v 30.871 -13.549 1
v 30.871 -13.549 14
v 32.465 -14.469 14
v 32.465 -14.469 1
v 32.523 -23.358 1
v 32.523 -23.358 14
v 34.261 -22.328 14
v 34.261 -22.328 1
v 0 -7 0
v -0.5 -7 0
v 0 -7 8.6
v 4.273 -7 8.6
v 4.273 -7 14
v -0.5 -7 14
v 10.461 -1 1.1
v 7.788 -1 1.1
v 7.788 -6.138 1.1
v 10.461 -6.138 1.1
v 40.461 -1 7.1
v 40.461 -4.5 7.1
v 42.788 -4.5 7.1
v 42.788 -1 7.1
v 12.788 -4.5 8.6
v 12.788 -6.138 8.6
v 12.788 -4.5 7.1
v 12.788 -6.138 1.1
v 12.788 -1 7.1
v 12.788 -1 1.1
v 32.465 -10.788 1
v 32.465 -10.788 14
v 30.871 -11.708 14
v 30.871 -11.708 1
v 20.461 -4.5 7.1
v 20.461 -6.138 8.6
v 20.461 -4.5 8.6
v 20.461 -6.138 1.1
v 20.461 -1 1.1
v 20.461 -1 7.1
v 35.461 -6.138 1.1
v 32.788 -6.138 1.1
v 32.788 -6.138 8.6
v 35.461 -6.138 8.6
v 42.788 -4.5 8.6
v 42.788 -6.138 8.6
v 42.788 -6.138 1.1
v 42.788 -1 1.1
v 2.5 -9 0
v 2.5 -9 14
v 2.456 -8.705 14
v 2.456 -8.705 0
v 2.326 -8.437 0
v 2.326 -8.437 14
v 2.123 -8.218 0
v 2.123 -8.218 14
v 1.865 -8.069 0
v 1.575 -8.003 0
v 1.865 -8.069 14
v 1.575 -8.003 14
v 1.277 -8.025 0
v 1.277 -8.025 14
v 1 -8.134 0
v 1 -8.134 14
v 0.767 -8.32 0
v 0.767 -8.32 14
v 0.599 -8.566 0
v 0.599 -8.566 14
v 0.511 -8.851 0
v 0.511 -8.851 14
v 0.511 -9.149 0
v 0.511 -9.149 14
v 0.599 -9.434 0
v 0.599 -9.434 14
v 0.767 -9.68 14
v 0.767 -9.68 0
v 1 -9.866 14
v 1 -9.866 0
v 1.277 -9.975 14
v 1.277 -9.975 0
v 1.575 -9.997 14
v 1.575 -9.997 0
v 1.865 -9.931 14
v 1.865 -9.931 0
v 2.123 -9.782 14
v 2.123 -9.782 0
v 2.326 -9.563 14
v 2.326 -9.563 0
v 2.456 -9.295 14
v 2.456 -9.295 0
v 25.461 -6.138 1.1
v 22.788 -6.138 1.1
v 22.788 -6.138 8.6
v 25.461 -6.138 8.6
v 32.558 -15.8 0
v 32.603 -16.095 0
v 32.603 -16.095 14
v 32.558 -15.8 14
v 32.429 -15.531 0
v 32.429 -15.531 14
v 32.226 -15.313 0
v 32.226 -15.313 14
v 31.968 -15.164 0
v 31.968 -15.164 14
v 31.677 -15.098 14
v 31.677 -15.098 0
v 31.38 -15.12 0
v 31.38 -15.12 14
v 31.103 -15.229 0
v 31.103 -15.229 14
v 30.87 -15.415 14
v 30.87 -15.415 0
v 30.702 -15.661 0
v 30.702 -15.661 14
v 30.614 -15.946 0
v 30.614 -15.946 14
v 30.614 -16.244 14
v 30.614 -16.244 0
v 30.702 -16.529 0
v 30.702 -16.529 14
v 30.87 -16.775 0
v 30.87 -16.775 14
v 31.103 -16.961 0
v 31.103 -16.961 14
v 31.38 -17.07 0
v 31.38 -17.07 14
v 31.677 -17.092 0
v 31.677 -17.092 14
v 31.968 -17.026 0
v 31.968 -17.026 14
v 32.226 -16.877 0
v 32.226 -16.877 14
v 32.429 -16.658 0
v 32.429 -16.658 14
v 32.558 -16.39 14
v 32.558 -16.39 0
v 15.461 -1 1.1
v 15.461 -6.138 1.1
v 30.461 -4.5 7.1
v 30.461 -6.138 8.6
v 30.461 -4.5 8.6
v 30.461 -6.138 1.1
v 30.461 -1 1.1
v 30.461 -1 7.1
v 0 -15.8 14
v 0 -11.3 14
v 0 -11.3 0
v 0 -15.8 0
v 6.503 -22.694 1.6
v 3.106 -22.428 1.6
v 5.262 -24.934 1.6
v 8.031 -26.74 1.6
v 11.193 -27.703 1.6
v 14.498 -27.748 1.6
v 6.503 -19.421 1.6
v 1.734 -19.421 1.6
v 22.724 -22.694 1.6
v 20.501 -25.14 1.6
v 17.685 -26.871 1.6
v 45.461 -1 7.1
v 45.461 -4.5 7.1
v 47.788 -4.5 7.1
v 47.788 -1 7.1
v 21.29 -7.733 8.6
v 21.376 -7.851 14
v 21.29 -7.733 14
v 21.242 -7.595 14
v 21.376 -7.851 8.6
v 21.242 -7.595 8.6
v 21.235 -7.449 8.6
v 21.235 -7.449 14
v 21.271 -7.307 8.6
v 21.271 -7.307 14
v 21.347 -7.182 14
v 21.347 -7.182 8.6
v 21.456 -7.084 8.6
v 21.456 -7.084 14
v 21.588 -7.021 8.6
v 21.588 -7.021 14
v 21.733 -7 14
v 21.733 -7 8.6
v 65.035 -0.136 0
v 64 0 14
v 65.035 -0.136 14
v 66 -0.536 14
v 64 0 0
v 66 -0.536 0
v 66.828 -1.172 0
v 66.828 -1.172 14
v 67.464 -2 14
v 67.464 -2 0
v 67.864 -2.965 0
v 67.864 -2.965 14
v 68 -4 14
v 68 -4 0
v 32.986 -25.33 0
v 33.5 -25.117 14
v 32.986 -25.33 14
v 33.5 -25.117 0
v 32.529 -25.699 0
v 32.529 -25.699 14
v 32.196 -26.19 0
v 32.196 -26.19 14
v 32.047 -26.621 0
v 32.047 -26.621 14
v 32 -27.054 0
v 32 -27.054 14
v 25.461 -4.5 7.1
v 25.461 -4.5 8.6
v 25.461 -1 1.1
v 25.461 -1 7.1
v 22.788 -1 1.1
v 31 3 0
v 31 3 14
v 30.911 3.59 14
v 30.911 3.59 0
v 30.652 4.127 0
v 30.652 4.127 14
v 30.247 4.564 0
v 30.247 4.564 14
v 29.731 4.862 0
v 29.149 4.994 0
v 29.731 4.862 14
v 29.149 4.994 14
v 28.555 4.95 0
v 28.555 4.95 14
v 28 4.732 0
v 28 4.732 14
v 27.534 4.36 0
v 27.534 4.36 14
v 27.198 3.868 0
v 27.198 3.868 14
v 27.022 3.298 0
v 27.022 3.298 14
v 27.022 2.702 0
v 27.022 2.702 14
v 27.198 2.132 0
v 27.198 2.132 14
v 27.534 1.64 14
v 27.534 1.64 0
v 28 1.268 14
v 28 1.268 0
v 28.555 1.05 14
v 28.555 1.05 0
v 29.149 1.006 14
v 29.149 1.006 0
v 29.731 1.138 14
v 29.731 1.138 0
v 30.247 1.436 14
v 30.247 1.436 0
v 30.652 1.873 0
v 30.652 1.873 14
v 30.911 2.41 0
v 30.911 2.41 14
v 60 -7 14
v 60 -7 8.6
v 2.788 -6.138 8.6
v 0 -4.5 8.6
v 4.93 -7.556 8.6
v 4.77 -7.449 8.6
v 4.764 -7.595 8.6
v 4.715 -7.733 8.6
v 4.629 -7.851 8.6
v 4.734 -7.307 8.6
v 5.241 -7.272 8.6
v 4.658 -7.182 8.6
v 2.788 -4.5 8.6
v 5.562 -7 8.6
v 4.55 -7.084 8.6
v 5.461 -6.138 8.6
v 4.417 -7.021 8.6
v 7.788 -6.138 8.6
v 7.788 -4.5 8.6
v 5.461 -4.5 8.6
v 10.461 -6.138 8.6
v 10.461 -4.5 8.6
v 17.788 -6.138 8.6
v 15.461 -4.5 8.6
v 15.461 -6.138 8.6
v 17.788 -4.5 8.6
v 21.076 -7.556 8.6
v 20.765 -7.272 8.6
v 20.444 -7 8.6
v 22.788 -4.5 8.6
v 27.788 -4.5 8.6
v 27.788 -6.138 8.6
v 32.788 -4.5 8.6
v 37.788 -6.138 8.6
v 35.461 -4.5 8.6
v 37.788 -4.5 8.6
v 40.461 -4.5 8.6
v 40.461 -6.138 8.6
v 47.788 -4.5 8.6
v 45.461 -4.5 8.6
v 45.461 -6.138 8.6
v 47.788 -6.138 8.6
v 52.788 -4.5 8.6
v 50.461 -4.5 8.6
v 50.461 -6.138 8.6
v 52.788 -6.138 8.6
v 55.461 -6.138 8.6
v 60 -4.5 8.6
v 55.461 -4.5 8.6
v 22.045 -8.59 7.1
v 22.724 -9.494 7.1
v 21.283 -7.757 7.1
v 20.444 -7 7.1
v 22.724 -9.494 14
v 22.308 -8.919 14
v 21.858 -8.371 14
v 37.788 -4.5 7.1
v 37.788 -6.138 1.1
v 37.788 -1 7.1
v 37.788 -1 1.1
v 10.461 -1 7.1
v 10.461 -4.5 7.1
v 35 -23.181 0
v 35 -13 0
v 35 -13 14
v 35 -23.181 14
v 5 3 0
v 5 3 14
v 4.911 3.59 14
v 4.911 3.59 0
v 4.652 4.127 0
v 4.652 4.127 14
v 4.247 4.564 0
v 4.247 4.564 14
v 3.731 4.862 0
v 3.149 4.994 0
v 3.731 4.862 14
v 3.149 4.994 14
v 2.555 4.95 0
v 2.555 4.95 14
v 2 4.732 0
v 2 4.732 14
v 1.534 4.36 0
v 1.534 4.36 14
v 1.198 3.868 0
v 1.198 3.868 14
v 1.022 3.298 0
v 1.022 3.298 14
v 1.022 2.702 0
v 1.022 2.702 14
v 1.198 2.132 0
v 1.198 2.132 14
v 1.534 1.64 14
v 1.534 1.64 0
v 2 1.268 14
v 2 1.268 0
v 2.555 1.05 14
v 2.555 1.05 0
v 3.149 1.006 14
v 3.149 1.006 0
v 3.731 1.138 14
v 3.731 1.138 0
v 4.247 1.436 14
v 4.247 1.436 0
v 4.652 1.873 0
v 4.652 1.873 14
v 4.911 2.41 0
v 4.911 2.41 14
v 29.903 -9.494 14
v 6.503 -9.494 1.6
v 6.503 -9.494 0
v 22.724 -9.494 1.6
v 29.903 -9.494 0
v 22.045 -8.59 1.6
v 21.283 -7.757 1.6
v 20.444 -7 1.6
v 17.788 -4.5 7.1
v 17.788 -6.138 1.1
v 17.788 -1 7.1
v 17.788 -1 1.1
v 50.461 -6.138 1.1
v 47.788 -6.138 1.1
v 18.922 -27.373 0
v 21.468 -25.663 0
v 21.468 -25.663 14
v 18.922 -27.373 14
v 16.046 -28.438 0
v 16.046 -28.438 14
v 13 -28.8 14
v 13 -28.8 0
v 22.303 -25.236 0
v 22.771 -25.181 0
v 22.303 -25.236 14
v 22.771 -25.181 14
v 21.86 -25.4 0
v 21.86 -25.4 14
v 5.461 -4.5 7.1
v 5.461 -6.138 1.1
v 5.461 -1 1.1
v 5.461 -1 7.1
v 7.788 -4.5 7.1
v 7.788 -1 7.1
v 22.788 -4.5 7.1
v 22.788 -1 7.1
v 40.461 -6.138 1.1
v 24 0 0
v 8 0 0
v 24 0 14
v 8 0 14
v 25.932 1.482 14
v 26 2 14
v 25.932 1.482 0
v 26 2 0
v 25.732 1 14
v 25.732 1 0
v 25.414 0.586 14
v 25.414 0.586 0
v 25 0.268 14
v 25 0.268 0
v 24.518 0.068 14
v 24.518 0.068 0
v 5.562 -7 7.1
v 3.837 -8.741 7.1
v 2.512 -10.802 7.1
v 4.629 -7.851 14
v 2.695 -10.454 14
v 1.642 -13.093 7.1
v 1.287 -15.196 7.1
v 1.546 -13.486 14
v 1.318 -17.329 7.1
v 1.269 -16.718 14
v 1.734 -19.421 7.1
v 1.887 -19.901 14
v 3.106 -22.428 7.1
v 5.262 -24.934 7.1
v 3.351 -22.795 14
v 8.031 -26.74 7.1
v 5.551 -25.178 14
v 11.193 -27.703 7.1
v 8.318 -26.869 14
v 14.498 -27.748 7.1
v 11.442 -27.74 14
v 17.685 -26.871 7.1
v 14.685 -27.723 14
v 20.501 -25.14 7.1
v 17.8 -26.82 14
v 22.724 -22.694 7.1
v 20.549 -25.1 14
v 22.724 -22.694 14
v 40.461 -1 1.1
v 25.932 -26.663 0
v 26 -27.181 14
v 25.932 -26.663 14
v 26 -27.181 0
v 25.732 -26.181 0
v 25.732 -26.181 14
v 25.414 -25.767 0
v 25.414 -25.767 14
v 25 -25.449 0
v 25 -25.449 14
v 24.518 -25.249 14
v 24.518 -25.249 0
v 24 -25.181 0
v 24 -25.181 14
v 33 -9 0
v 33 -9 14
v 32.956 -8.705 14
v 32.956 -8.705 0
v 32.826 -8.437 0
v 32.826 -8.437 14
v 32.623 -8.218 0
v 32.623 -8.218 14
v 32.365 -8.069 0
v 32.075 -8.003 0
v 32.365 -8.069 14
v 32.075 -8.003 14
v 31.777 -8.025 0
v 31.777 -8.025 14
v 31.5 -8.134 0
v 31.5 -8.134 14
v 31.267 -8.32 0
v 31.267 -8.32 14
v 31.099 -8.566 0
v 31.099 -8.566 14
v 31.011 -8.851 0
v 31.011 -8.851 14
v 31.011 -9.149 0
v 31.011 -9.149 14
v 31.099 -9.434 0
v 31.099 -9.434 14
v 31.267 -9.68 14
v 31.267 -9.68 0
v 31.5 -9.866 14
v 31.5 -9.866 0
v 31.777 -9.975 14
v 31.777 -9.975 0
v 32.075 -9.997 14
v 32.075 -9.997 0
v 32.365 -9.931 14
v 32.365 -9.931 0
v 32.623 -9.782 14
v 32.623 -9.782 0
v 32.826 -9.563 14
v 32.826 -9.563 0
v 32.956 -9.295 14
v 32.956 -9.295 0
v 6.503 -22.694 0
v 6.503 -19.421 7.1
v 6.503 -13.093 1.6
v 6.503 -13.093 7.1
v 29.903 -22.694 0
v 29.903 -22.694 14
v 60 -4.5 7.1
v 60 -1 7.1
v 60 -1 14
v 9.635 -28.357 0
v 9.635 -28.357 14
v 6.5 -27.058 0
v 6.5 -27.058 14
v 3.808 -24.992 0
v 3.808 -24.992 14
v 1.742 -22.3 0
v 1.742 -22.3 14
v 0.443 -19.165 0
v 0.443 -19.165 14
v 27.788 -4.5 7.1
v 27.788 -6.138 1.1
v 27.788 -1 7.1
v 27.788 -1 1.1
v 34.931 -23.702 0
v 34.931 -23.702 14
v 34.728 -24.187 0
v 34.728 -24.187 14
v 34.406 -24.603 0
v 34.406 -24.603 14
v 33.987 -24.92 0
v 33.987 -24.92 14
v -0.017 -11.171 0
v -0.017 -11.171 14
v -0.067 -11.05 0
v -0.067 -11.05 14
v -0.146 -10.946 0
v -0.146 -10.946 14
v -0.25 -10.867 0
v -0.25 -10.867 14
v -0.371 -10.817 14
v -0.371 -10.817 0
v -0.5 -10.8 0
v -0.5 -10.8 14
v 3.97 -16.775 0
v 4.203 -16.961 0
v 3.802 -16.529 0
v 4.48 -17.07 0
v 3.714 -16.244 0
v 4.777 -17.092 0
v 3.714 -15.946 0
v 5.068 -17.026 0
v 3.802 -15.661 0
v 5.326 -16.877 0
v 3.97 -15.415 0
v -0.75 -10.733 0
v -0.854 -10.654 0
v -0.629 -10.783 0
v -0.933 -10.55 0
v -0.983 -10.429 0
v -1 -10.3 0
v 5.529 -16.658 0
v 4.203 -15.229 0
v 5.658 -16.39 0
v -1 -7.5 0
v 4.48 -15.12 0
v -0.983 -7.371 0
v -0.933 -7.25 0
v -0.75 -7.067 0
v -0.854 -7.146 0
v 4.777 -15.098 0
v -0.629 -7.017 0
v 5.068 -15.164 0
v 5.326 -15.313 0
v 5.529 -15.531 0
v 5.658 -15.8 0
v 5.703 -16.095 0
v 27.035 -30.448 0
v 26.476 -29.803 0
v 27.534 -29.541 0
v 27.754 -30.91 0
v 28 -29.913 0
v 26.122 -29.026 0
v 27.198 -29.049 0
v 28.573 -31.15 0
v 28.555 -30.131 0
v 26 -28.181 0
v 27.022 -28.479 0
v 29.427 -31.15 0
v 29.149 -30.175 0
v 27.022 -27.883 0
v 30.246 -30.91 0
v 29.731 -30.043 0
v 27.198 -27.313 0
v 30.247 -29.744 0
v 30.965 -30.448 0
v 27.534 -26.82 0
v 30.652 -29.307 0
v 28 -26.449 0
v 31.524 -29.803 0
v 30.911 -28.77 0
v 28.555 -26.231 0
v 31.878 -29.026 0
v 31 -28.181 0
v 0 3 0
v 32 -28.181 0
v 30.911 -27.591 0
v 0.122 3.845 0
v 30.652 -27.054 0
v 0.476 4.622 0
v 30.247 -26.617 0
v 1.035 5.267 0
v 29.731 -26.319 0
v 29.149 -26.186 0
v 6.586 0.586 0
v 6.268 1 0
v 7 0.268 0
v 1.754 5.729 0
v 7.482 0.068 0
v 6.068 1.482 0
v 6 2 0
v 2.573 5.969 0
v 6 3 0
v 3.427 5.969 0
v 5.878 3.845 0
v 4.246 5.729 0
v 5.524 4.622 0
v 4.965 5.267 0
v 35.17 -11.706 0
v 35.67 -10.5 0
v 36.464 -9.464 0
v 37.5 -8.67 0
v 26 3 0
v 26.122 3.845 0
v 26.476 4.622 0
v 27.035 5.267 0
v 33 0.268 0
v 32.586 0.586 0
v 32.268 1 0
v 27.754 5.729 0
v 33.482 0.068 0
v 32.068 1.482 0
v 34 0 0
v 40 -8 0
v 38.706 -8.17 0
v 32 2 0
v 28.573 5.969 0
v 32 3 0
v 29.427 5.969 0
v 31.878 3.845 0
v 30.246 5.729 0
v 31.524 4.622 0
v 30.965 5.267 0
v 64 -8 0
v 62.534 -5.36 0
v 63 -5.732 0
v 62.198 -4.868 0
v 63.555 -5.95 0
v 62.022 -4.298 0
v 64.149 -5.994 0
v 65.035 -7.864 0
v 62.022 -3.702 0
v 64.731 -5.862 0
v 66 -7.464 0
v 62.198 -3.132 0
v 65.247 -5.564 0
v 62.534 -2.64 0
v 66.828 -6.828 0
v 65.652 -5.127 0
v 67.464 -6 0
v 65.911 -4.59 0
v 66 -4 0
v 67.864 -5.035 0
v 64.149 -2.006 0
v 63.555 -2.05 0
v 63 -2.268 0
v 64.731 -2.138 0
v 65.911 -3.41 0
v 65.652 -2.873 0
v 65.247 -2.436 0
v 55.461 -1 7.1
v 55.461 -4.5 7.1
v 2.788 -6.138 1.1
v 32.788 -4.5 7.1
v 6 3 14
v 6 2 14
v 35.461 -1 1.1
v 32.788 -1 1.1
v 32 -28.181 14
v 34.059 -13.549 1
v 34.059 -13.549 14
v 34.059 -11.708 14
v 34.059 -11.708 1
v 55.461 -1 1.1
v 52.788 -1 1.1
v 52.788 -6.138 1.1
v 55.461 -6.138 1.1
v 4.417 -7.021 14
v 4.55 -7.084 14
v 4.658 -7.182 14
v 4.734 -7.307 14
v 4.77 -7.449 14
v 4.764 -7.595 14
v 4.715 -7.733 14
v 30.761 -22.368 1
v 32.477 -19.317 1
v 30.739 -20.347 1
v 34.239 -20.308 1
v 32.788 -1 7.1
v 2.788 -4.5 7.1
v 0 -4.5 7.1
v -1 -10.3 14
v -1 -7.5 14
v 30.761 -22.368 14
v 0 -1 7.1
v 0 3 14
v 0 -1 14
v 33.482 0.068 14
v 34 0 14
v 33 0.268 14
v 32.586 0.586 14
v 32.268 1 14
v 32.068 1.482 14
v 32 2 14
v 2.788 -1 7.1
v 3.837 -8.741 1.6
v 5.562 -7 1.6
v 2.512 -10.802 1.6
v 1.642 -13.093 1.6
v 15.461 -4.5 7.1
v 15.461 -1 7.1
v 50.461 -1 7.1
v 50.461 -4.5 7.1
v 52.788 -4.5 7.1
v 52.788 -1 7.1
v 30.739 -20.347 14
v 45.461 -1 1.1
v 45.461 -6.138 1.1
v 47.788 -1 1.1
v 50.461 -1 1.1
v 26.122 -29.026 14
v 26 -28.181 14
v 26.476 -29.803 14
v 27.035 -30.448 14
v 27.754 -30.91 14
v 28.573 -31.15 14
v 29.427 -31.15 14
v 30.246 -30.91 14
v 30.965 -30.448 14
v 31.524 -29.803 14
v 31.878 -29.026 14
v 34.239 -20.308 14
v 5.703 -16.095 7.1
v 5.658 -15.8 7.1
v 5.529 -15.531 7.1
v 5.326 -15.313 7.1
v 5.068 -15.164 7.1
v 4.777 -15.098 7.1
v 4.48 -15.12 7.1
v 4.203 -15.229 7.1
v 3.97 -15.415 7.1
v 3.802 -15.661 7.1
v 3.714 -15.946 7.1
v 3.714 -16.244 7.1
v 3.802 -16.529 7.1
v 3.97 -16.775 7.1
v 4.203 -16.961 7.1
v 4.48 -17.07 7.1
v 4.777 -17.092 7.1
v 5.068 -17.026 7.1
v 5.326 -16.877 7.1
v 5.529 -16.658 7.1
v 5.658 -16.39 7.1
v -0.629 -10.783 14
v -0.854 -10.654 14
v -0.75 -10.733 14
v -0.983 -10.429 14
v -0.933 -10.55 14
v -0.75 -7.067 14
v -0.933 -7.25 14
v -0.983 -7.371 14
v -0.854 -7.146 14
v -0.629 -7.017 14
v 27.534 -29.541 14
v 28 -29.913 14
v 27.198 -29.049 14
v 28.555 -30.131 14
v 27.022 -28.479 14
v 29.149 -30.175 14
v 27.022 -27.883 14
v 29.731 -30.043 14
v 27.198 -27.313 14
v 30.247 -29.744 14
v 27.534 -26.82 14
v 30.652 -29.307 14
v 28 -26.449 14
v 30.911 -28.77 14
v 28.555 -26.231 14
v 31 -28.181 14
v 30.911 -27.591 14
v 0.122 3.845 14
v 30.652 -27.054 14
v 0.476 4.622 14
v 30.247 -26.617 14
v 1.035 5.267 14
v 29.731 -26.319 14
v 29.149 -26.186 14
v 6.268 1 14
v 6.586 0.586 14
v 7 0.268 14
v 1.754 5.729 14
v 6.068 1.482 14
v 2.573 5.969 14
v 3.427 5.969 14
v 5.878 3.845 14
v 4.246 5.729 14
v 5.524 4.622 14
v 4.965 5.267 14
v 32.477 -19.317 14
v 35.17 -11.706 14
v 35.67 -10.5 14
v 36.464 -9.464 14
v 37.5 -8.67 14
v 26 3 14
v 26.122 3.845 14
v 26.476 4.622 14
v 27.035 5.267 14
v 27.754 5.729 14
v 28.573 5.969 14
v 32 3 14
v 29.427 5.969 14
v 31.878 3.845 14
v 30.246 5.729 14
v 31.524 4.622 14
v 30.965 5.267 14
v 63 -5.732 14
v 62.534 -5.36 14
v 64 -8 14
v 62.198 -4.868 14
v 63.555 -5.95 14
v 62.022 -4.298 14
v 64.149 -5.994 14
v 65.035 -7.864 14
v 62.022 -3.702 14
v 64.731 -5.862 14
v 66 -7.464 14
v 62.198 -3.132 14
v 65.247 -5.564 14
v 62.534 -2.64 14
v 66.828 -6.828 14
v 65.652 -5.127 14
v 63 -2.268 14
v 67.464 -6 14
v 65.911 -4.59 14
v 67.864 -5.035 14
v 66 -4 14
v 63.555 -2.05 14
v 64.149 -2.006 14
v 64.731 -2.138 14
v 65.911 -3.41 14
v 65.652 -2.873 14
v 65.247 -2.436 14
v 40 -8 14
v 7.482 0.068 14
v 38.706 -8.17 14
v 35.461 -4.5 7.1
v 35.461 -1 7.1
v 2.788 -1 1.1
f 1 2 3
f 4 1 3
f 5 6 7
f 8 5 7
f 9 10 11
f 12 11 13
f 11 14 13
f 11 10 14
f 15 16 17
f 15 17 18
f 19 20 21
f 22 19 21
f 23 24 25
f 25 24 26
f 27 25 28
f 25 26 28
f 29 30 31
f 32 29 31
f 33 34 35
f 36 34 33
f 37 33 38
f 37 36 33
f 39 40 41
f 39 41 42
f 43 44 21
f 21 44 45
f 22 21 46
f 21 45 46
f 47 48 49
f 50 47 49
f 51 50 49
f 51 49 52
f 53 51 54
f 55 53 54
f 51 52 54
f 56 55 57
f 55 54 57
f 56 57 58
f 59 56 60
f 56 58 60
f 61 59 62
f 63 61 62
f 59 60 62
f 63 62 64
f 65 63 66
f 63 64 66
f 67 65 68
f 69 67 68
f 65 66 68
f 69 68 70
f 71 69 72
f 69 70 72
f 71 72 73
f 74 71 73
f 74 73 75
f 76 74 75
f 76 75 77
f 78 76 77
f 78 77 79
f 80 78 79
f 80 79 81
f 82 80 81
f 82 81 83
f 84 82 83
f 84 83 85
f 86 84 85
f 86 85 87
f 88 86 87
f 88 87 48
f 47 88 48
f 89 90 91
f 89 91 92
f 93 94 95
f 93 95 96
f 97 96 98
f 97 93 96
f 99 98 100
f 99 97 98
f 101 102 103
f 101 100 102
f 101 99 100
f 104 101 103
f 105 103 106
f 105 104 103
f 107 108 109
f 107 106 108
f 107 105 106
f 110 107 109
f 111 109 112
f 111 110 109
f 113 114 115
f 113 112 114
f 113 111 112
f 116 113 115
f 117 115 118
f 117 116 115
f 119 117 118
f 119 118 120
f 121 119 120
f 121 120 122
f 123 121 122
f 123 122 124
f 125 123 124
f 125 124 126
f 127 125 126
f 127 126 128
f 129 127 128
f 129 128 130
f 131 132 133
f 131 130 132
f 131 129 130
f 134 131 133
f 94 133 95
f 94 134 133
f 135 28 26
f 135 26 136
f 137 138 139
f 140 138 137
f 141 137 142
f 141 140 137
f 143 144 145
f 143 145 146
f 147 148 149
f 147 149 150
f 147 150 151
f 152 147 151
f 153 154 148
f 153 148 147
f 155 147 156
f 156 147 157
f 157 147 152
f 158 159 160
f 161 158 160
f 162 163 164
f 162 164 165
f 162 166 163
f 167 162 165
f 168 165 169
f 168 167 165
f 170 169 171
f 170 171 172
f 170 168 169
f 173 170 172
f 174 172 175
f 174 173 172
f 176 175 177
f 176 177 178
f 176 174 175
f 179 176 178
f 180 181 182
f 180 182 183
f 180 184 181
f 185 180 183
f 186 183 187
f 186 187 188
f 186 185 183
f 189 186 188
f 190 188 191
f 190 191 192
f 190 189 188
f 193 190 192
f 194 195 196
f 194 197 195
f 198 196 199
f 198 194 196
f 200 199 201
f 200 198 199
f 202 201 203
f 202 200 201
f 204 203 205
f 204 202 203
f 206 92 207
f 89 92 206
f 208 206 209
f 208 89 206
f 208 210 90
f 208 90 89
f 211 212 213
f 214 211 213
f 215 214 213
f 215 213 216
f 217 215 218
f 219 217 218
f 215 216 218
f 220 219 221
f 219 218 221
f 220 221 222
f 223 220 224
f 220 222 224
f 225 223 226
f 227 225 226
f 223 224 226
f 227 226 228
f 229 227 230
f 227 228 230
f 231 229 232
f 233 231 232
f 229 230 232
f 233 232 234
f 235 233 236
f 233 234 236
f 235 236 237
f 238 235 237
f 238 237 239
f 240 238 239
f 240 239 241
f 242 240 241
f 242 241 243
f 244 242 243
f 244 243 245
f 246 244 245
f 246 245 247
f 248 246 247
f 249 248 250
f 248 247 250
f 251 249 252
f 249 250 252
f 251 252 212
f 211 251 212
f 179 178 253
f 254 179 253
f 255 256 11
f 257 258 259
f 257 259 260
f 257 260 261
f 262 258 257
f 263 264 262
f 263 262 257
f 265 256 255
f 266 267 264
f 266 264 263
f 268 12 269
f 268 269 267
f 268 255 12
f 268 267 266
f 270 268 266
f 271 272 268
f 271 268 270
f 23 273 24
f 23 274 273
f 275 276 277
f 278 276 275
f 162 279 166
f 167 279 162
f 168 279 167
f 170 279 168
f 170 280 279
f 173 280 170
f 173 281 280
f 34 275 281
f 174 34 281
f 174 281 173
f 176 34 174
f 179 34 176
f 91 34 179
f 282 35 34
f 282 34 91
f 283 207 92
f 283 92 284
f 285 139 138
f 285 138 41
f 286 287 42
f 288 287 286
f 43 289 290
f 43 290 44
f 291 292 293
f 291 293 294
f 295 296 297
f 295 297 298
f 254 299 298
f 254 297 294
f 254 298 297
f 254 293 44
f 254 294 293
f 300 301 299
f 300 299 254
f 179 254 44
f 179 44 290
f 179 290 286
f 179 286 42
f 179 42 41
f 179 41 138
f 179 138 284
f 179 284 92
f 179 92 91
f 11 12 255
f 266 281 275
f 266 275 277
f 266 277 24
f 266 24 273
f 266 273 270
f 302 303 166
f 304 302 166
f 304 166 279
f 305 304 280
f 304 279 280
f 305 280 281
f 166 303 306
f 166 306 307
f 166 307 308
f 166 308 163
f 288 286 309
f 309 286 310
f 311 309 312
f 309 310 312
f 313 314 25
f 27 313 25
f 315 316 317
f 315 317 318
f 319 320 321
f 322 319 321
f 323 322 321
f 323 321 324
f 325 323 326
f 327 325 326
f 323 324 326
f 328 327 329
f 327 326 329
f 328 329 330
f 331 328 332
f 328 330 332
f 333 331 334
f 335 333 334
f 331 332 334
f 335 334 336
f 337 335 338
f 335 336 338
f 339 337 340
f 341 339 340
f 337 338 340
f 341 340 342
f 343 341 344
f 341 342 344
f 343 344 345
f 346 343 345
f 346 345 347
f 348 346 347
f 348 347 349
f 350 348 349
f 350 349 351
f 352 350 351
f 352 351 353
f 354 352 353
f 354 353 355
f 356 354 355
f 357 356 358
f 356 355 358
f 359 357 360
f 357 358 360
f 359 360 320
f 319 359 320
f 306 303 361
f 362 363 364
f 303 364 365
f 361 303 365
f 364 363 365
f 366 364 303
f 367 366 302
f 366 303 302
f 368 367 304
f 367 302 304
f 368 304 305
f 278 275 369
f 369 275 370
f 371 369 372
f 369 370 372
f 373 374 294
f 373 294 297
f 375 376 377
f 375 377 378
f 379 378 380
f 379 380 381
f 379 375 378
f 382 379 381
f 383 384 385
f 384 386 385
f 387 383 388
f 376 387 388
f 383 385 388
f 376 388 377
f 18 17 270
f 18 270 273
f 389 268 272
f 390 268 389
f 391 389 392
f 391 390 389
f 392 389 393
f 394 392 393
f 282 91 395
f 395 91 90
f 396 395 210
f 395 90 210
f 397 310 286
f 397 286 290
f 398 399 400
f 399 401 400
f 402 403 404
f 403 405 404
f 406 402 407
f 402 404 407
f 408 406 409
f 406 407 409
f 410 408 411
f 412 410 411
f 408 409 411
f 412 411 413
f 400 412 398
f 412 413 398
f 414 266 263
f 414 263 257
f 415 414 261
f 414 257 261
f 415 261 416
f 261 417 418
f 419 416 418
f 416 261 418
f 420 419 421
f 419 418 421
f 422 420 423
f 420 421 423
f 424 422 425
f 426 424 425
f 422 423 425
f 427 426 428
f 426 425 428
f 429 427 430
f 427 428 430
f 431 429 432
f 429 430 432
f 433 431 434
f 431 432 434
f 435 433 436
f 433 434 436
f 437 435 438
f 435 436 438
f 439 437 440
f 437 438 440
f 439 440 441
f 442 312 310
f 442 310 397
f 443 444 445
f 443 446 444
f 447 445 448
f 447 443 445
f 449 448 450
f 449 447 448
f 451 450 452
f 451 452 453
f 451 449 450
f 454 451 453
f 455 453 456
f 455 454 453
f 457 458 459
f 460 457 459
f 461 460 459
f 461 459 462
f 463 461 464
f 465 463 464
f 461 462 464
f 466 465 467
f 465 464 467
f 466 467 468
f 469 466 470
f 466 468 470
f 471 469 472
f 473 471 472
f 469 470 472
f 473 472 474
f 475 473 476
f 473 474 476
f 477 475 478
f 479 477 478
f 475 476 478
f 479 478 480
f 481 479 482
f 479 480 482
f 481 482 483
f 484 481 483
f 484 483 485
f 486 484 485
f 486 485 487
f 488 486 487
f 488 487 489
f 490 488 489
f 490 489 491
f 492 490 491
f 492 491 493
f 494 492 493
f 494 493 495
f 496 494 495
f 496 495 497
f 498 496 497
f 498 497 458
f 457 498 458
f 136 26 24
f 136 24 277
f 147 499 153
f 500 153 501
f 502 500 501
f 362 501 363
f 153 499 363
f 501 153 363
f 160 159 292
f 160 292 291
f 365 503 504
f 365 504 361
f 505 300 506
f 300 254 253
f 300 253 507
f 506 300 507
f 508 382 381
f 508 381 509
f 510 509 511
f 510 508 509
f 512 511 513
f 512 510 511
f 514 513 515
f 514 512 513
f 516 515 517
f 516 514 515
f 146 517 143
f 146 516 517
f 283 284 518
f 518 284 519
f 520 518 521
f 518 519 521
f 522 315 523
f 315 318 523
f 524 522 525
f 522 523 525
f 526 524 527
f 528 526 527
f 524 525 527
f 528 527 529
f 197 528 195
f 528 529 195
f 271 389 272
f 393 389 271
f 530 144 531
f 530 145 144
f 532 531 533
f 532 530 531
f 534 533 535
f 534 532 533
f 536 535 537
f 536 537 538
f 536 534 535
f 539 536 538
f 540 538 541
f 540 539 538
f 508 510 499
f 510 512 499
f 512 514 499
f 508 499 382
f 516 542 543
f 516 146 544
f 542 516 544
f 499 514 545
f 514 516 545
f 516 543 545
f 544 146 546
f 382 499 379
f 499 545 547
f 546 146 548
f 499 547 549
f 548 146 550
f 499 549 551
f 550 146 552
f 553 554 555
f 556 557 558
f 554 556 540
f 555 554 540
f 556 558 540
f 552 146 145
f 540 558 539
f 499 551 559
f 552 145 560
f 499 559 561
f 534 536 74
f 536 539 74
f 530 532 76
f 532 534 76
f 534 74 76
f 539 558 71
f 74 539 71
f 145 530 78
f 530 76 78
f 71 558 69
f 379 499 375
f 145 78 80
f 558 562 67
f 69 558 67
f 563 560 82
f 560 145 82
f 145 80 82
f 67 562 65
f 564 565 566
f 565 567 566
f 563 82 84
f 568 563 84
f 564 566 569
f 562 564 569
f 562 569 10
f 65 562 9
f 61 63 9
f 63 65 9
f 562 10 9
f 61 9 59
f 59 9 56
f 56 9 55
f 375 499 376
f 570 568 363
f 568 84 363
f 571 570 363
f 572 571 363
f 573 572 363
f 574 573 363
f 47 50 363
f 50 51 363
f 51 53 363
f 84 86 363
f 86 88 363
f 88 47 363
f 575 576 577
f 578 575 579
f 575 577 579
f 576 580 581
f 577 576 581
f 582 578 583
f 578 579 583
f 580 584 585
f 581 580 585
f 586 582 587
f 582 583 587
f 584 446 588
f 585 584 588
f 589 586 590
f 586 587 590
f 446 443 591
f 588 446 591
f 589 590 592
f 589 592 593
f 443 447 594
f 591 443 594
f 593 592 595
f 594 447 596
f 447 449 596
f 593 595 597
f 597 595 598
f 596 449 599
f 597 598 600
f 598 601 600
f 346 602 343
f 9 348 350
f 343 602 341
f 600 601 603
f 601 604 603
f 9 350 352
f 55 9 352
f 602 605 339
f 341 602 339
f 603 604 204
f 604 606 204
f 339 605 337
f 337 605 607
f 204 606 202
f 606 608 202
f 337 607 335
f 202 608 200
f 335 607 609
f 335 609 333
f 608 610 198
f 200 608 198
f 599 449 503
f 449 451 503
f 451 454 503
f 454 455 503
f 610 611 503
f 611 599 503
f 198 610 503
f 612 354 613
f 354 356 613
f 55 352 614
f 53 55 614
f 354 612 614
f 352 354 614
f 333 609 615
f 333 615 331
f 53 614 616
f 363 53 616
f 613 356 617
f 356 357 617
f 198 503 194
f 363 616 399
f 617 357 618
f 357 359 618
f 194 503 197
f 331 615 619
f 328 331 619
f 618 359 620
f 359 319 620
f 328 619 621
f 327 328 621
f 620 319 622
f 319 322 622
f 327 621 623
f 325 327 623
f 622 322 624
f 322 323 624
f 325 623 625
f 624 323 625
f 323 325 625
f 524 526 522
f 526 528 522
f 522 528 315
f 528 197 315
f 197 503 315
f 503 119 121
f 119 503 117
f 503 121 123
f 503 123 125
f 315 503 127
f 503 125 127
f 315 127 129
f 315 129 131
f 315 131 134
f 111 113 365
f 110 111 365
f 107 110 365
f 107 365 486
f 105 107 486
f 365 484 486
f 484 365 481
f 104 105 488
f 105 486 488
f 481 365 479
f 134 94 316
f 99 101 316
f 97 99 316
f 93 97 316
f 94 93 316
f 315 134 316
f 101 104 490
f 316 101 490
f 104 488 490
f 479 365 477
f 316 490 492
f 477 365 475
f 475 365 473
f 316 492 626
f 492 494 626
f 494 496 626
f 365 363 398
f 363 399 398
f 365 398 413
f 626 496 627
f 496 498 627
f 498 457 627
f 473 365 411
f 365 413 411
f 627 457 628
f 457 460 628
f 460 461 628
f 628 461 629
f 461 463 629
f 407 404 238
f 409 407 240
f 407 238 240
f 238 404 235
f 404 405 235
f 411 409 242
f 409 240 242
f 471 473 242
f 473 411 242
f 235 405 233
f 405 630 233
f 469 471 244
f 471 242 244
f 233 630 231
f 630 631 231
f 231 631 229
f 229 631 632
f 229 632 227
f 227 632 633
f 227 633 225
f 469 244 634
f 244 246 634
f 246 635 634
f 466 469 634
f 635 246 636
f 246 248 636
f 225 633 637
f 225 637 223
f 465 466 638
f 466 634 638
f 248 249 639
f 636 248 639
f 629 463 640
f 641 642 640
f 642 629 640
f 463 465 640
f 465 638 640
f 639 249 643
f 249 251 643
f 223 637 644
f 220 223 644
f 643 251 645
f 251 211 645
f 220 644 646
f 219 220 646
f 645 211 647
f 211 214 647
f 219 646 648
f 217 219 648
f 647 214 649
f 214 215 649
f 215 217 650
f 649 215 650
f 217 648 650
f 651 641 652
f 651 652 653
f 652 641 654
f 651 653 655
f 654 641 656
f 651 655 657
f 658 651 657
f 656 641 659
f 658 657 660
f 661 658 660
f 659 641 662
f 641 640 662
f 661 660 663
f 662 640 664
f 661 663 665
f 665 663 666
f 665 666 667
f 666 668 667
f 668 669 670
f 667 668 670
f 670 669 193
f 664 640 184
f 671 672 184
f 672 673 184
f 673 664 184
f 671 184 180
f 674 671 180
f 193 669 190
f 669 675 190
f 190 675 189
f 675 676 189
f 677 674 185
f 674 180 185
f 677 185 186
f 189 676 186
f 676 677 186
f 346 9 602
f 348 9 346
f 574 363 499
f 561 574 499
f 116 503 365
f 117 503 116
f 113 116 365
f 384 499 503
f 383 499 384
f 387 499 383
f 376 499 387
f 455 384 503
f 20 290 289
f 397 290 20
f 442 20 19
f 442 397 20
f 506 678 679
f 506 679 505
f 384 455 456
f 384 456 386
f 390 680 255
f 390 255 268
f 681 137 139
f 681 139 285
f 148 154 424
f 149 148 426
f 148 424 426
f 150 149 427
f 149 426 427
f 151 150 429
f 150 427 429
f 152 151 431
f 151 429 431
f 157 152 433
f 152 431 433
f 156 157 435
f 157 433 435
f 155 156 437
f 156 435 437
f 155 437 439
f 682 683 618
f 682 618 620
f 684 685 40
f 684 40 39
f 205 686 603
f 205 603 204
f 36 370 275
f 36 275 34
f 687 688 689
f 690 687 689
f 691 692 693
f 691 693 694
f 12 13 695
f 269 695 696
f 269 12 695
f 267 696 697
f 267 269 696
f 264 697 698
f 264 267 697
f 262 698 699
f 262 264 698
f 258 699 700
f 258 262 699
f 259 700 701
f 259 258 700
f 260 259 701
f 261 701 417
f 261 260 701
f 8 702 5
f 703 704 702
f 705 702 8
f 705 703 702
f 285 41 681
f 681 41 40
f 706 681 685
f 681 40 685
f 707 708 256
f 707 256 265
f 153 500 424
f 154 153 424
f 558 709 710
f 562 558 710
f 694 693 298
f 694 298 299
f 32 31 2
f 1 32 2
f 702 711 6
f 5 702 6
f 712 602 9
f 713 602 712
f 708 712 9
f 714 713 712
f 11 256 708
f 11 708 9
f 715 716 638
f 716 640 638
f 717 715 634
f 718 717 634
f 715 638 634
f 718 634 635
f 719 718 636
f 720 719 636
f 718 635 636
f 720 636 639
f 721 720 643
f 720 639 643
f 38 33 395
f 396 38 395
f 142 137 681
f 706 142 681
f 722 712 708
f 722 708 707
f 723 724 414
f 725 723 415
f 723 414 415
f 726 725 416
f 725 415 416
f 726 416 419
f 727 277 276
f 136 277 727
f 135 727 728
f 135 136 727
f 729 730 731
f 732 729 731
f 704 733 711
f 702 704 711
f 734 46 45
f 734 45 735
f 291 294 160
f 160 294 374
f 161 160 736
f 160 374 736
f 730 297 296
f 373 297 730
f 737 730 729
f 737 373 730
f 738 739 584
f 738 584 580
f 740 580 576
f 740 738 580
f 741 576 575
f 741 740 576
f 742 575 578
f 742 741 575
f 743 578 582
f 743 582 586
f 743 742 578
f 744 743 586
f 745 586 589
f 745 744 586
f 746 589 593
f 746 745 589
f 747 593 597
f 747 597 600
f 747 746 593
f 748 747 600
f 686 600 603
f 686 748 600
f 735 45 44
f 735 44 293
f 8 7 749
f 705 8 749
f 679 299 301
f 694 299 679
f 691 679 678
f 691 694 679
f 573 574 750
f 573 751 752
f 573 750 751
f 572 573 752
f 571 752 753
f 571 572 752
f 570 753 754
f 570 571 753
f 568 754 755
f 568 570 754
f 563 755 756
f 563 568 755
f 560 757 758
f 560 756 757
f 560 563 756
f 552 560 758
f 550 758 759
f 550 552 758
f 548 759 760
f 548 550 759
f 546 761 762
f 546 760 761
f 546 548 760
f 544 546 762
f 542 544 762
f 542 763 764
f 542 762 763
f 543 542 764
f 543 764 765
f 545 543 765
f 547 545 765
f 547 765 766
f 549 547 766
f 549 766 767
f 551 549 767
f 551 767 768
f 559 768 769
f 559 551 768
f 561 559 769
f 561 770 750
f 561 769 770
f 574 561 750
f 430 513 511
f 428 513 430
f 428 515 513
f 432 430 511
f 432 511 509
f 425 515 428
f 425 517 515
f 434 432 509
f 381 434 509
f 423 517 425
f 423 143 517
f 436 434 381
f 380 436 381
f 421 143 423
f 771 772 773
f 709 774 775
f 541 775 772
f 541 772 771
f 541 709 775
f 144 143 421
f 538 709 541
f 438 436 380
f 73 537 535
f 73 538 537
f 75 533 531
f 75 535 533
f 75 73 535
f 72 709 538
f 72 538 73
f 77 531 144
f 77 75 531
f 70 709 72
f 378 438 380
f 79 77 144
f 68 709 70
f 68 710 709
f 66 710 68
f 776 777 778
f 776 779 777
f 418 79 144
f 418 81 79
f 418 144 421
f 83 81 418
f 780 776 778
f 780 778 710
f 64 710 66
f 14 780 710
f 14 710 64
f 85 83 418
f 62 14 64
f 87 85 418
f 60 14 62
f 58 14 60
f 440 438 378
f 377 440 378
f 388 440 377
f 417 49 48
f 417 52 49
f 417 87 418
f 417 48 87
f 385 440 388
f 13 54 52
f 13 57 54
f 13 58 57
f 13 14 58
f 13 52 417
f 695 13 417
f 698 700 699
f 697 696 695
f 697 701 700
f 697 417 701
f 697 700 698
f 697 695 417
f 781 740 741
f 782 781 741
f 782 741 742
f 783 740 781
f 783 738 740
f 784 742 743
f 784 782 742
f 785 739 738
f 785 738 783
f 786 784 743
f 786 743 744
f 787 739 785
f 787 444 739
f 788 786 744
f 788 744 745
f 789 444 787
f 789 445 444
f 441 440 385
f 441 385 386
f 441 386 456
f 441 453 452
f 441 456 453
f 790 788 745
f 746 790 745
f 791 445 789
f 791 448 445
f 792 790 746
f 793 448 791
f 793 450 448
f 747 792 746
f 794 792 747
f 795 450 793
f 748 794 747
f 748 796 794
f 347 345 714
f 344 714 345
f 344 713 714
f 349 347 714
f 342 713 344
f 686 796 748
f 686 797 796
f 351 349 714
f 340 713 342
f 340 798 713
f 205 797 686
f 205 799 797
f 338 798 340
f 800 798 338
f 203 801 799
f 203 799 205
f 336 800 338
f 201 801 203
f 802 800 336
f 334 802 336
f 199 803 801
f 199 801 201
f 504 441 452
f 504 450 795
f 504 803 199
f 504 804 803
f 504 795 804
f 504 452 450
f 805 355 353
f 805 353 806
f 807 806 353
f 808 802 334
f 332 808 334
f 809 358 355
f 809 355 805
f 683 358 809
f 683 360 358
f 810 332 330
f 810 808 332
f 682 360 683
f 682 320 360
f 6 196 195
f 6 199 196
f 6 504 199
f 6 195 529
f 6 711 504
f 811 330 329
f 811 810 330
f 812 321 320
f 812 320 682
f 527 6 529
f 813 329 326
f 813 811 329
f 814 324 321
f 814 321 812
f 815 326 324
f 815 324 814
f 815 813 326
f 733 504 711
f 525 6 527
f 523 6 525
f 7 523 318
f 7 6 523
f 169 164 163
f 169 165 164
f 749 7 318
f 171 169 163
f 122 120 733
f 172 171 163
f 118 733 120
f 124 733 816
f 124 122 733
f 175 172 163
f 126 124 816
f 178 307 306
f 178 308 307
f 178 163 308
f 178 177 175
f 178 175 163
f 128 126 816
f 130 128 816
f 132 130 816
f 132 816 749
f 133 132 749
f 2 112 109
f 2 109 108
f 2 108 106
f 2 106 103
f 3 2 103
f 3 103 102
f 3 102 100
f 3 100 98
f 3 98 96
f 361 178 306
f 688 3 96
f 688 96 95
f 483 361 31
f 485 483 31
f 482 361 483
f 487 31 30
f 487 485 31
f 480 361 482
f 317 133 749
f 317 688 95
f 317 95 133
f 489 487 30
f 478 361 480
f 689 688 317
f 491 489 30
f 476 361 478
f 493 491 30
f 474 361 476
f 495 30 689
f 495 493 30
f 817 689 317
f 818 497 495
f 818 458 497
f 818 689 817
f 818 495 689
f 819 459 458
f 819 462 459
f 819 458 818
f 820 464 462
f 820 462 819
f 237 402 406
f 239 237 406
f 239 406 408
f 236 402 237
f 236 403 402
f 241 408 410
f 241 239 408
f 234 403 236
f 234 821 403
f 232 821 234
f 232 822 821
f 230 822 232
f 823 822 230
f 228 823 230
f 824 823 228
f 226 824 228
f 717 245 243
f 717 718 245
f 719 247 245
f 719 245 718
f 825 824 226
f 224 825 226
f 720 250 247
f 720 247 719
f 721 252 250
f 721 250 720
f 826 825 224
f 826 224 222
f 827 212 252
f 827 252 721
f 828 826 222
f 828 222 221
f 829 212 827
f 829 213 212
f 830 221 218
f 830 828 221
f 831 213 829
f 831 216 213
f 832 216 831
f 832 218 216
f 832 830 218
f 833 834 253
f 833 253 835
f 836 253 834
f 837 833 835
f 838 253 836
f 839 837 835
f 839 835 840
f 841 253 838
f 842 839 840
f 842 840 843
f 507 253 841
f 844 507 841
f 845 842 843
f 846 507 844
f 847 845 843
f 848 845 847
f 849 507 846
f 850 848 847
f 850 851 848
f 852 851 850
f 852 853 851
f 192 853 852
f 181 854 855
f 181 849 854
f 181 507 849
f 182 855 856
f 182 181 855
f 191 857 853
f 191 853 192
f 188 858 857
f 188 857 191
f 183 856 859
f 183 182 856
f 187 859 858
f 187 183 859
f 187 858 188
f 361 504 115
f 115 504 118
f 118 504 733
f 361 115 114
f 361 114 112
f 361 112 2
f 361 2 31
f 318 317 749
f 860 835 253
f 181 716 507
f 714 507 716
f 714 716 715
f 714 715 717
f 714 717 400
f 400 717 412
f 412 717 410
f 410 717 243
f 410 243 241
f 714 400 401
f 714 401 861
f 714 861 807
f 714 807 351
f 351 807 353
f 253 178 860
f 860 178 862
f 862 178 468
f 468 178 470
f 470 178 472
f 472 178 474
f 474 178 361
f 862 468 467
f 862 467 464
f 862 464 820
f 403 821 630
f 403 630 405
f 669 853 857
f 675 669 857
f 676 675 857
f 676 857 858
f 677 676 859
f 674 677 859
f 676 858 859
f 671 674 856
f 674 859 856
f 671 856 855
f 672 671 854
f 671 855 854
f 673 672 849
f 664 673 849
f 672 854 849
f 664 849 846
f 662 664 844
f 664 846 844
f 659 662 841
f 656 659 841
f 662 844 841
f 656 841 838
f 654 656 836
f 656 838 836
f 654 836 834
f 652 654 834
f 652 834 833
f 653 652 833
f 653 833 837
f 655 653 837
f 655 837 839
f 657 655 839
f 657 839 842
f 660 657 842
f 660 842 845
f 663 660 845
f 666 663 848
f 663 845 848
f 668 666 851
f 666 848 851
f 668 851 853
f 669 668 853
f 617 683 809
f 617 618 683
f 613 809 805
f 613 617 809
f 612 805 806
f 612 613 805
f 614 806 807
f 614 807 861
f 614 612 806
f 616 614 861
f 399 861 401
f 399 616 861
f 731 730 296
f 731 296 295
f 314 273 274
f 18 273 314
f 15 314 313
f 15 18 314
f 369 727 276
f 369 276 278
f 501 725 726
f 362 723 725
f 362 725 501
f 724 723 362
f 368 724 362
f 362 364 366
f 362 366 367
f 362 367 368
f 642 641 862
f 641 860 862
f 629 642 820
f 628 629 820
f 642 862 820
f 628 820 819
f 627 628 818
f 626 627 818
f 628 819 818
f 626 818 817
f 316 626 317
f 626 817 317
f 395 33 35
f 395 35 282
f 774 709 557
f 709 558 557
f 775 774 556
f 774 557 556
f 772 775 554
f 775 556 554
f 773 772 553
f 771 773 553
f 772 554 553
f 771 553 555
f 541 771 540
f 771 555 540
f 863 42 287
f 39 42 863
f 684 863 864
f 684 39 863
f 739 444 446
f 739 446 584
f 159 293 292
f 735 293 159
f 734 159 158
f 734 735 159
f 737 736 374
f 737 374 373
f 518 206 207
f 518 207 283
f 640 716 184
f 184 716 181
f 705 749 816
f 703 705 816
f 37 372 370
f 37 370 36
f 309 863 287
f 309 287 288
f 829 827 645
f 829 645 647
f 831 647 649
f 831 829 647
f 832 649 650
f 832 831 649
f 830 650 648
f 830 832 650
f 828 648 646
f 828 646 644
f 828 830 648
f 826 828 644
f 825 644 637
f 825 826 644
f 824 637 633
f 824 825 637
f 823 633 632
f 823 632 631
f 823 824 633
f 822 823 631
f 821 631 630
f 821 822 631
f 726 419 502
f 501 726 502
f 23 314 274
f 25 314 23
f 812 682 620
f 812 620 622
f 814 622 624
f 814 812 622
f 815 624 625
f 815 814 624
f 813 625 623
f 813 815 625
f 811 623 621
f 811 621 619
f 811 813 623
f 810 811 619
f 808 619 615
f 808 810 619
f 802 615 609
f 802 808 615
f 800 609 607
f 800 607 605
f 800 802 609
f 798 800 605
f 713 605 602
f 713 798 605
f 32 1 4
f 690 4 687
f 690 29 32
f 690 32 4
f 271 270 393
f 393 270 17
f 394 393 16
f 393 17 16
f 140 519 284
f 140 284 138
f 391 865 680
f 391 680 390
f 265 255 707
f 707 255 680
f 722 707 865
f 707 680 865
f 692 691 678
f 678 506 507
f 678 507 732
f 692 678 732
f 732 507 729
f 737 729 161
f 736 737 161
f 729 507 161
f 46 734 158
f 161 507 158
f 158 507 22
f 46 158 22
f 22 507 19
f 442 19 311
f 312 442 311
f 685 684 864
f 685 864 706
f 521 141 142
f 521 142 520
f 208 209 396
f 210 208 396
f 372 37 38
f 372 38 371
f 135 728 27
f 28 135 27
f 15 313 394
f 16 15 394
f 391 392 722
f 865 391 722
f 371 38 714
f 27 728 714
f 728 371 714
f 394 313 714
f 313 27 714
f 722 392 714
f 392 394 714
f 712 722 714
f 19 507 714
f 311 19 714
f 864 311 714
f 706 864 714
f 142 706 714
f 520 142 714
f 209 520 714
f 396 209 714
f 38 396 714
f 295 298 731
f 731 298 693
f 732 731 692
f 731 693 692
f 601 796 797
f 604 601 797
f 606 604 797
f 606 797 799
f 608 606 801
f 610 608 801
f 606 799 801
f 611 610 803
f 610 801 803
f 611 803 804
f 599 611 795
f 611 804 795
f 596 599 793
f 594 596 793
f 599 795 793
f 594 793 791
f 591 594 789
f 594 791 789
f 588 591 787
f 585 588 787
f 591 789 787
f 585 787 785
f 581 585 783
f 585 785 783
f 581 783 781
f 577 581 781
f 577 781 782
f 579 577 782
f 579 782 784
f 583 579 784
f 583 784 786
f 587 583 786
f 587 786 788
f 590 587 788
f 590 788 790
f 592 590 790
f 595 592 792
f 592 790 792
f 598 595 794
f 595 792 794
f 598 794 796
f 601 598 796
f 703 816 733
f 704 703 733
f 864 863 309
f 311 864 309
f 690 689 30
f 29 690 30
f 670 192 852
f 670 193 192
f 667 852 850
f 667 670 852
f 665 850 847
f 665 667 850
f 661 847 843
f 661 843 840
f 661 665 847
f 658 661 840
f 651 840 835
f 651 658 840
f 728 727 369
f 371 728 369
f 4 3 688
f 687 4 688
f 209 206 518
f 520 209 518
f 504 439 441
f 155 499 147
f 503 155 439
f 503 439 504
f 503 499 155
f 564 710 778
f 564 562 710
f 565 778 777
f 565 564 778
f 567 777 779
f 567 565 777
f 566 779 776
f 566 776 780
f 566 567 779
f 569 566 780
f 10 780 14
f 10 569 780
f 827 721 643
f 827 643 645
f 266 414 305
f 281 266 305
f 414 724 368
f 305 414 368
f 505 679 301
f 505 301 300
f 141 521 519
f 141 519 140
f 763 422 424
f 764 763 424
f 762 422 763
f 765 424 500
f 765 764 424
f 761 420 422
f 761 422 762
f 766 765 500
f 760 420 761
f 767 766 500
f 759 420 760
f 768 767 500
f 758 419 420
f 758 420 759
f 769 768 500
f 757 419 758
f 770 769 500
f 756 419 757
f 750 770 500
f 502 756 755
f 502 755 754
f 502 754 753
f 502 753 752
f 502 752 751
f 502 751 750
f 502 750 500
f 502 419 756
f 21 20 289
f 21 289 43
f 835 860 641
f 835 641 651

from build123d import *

# Parameters (mm, degrees)
BODY_DEPTH                      = 14
HAUPTAUSTRAGUNG_DEPTH           = 6.9
SERVOSCHNITT_DEPTH              = 69.010587411
SERVOSCHNITT_DEPTH_BACK         = 69.010587411
SERVO_W                         = 23.4
SERVO_H                         = 13.2
VERRUNDUNG2_R                   = 5
SCHRAUBENLOCH_DEPTH             = 69.010587411
SCHRAUBENLOCH_DEPTH_BACK        = 69.010587411
SERVOLOCHSCHRAUBEN_R            = 1
FUEHRUNG_W                      = 60
FUEHRUNG_H                      = 2.5
FUEHRUNGSSCHINE_DEPTH           = 1.5
VERRUNDUNG4_R                   = 2
HALTERUNG_R                     = 1
SCHNITT_LINEAR_AUSTRAGEN2_DEPTH = 69.010587411
SKIZZE5_R                       = 1
SCHNITT_LINEAR_AUSTRAGEN3_DEPTH = 69.010587411
SCHNITT_LINEAR_START            = -6
SKIZZE8_W                       = 2.673131507
SKIZZE8_H                       = 5.13849065
SCHNITT_LINEAR_AUSTRAGEN7_DEPTH = 73.931681587
LINEARES_MUSTER1_COUNT          = 11
LINEARES_MUSTER1_PITCH          = 5
SABSCHLUSS_W                    = 8
SABSCHLUSS_H                    = 8
ABSCHLUSS_DEPTH                 = 14
SKIZZE14_R                      = 2
ENDSTUTZEN_DEPTH                = 14
SKIZZESTUTZEN_R                 = 2
STUTZEN_DEPTH                   = 14
VERRUNDUNG5_R                   = 4
VERRUNDUNG6_R                   = 2
VERRUNDUNG7_R                   = 2
SECHSKANTLOCH_DEPTH             = 13
HALTERUNGLINKS_DEPTH            = 5.5
SKIZZE15_R                      = 2
AUFSATZ_LINEAR_AUSTRAGEN1_DEPTH = 14
VERRUNDUNG8_R                   = 2
SKIZZE16_W                      = 1
SKIZZE16_H                      = 3.8
AUFSATZ_LINEAR_AUSTRAGEN2_DEPTH = 14
VERRUNDUNG10_R                  = 0.5
VERRUNDUNG11_R                  = 0.5
VERRUNDUNG12_R                  = 0.5


with BuildPart() as part:
    # P-BodySkizze → body (new body)
    with BuildSketch(Plane.XY):
        with BuildLine():
            Line((0, 0), (60, 0))
            Line((60, 0), (60, -8))
            Line((60, -8), (35, -8))
            Line((35, -8), (35, -25.18083152))
            Line((35, -25.18083152), (22, -25.18083152))
            ThreePointArc((22, -25.18083152), (17.850215987, -27.861318538), (13, -28.8))
            ThreePointArc((13, -28.8), (3.807611845, -24.992388155), (0, -15.8))
            Line((0, -15.8), (0, 0))
        make_face()
    extrude(amount=BODY_DEPTH)

    # Austrag → hauptAustragung (cut)
    with BuildSketch(Plane.XY.offset(14)):
        with BuildLine():
            ThreePointArc((20.443697295, -7), (13.002720829, -4.343644442), (5.561744363, -7))
            Line((5.561744363, -7), (20.443697295, -7))
        make_face()
        with BuildLine():
            Line((20.443697295, -7), (5.561744363, -7))
            ThreePointArc((5.561744363, -7), (7.971268428, -26.711882843), (24.752720829, -16.093644442))
            ThreePointArc((24.752720829, -16.093644442), (23.62095923, -11.062192041), (20.443697295, -7))
        make_face()
        with BuildLine():
            Line((60, -1), (0, -1))
            Line((0, -1), (0, -7))
            Line((0, -7), (5.561744363, -7))
            ThreePointArc((5.561744363, -7), (13.002720829, -4.343644442), (20.443697295, -7))
            Line((20.443697295, -7), (60, -7))
            Line((60, -7), (60, -1))
        make_face()
    extrude(amount=-HAUPTAUSTRAGUNG_DEPTH, mode=Mode.SUBTRACT)

    # servo → ServoSchnitt (cut, two sides: drawn at the far end of the back side and taken through both)
    with BuildSketch(Plane.XY.offset(14).offset(-SERVOSCHNITT_DEPTH_BACK)):
        with Locations((18.202720829, -16.093644442)):
            Rectangle(SERVO_W, SERVO_H)
    extrude(amount=SERVOSCHNITT_DEPTH + SERVOSCHNITT_DEPTH_BACK, mode=Mode.SUBTRACT)

    # Verrundung2
    verrundung2_edges = [part.edges().sort_by_distance(p)[0] for p in [
        (35, -8, 7),
    ]]
    fillet(verrundung2_edges, radius=VERRUNDUNG2_R)

    # servolochschrauben → schraubenloch (cut, two sides: drawn at the far end of the back side and taken through both)
    with BuildSketch(Plane.XY.offset(14).offset(-SCHRAUBENLOCH_DEPTH_BACK)):
        with Locations((4.702720829, -16.094776923)):
            Circle(SERVOLOCHSCHRAUBEN_R)
        with Locations((31.602720829, -16.094776923)):
            Circle(SERVOLOCHSCHRAUBEN_R)
    extrude(amount=SCHRAUBENLOCH_DEPTH + SCHRAUBENLOCH_DEPTH_BACK, mode=Mode.SUBTRACT)

    # fuehrung → Fuehrungsschine (add)
    with BuildSketch(Plane.XY.offset(7.1)):
        with Locations((30, -5.75)):
            Rectangle(FUEHRUNG_W, FUEHRUNG_H)
    extrude(amount=FUEHRUNGSSCHINE_DEPTH)

    # Verrundung4
    verrundung4_edges = [part.edges().sort_by_distance(p)[0] for p in [
        (35, -25.18083152, 7),
    ]]
    fillet(verrundung4_edges, radius=VERRUNDUNG4_R)

    # halterung → Schnitt-Linear austragen2 (cut, through all)
    with BuildSketch(Plane.XY.offset(14)):
        with Locations((1.5, -9)):
            Circle(HALTERUNG_R)
    extrude(amount=-SCHNITT_LINEAR_AUSTRAGEN2_DEPTH, mode=Mode.SUBTRACT)

    # Skizze5 → Schnitt-Linear austragen3 (cut, through all)
    with BuildSketch(Plane.XY.offset(14)):
        with Locations((32, -9)):
            Circle(SKIZZE5_R)
    extrude(amount=-SCHNITT_LINEAR_AUSTRAGEN3_DEPTH, mode=Mode.SUBTRACT)

    # Skizze8 → Schnitt-Linear austragen7 (cut)
    with BuildSketch(Plane.XY.offset(7.1).offset(SCHNITT_LINEAR_START)):
        with Locations((4.124861588, -3.569245325)):
            Rectangle(SKIZZE8_W, SKIZZE8_H)
    schnitt_linear_austragen7 = extrude(amount=SCHNITT_LINEAR_AUSTRAGEN7_DEPTH, mode=Mode.SUBTRACT)

    # Lineares Muster1: Schnitt-Linear austragen7 ×11
    with Locations(*[(i * LINEARES_MUSTER1_PITCH, 0, 0) for i in range(1, LINEARES_MUSTER1_COUNT)]):
        add(schnitt_linear_austragen7, mode=Mode.SUBTRACT)

    # sabschluss → Abschluss (add)
    with BuildSketch(Plane.XY.offset(14)):
        with Locations((64, -4)):
            Rectangle(SABSCHLUSS_W, SABSCHLUSS_H)
    extrude(amount=-ABSCHLUSS_DEPTH)

    # Skizze14 → endstutzen (cut)
    with BuildSketch(Plane.XY.offset(14)):
        with Locations((64, -4)):
            Circle(SKIZZE14_R)
    extrude(amount=-ENDSTUTZEN_DEPTH, mode=Mode.SUBTRACT)

    # SkizzeStutzen → stutzen (add)
    # profile 1 of 2: a face of its own
    with BuildSketch(Plane.XY.offset(14)):
        with BuildLine():
            Line((32, -25.18083152), (26, -25.18083152))
            Line((26, -25.18083152), (26, -28.18083152))
            ThreePointArc((26, -28.18083152), (29, -31.18083152), (32, -28.18083152))
            Line((32, -28.18083152), (32, -25.18083152))
        make_face()
        with Locations((29, -28.18083152)):
            Circle(SKIZZESTUTZEN_R, mode=Mode.SUBTRACT)
    # profile 2 of 2: a face of its own
    with BuildSketch(Plane.XY.offset(14)):
        with BuildLine():
            Line((26, 3), (26, 0))
            Line((26, 0), (32, 0))
            Line((32, 0), (32, 3))
            ThreePointArc((32, 3), (29, 6), (26, 3))
        make_face()
        with Locations((29, 3)):
            Circle(SKIZZESTUTZEN_R, mode=Mode.SUBTRACT)
    extrude(amount=-STUTZEN_DEPTH)

    # Verrundung5
    verrundung5_edges = [part.edges().sort_by_distance(p)[0] for p in [
        (68, 0, 7),
        (68, -8, 7),
    ]]
    fillet(verrundung5_edges, radius=VERRUNDUNG5_R - 0.0001)  # a hair under: the kernel refuses the full size

    # Verrundung6
    verrundung6_edges = [part.edges().sort_by_distance(p)[0] for p in [
        (33, -25.18083152, 7),
        (26, -25.18083152, 7),
        (32, -25.18083152, 7),
        (32, 0, 7),
        (26, 0, 7),
    ]]
    fillet(verrundung6_edges, radius=VERRUNDUNG6_R)

    # Verrundung7
    verrundung7_edges = [part.edges().sort_by_distance(p)[0] for p in [
        (22, -25.18083152, 7),
    ]]
    fillet(verrundung7_edges, radius=VERRUNDUNG7_R)

    # sechskant-loch → sechskantloch (cut)
    with BuildSketch(Plane.XY.offset(14)):
        Polygon((34.261205516, -22.328313106), (34.238574988, -20.307713889), (32.477369472, -19.317012893), (30.738794484, -20.346911113), (30.761425012, -22.367510329), (32.522630528, -23.358211326), align=None)
        Polygon((32.465163938, -14.469262536), (34.059281734, -13.548898198), (34.059281734, -11.708169521), (32.465163938, -10.787805182), (30.871046143, -11.708169521), (30.871046143, -13.548898198), align=None)
    extrude(amount=-SECHSKANTLOCH_DEPTH, mode=Mode.SUBTRACT)

    # halterung links → halterungLinks (cut)
    with BuildSketch(Plane.XY.offset(7.1)):
        with BuildLine():
            Line((20.443697295, -7), (5.561744363, -7))
            ThreePointArc((5.561744363, -7), (3.120742136, -9.736837295), (1.642350763, -13.092895876))
            Line((1.642350763, -13.092895876), (6.502720829, -13.092895876))
            Line((6.502720829, -13.092895876), (6.502720829, -9.493644442))
            Line((6.502720829, -9.493644442), (22.723960462, -9.493644442))
            ThreePointArc((22.723960462, -9.493644442), (21.673936488, -8.164425124), (20.443697295, -7))
        make_face()
        with BuildLine():
            Line((6.502720829, -19.421283459), (1.733767081, -19.421283459))
            ThreePointArc((1.733767081, -19.421283459), (11.192764657, -27.703405794), (22.723960462, -22.693644442))
            Line((22.723960462, -22.693644442), (6.502720829, -22.693644442))
            Line((6.502720829, -22.693644442), (6.502720829, -19.421283459))
        make_face()
    extrude(amount=-HALTERUNGLINKS_DEPTH, mode=Mode.SUBTRACT)

    # Skizze15 → Aufsatz-Linear austragen1 (add)
    with BuildSketch(Plane.XY.offset(14)):
        with BuildLine():
            Line((0, 0), (6, 0))
            Line((6, 0), (6, 3))
            ThreePointArc((6, 3), (3, 6), (0, 3))
            Line((0, 3), (0, 0))
        make_face()
        with Locations((3, 3)):
            Circle(SKIZZE15_R, mode=Mode.SUBTRACT)
    extrude(amount=-AUFSATZ_LINEAR_AUSTRAGEN1_DEPTH)

    # Verrundung8
    verrundung8_edges = [part.edges().sort_by_distance(p)[0] for p in [
        (6, 0, 7),
    ]]
    fillet(verrundung8_edges, radius=VERRUNDUNG8_R)

    # Skizze16 → Aufsatz-Linear austragen2 (add)
    with BuildSketch(Plane.XY.offset(14)):
        with Locations((-0.5, -8.9)):
            Rectangle(SKIZZE16_W, SKIZZE16_H)
    extrude(amount=-AUFSATZ_LINEAR_AUSTRAGEN2_DEPTH)

    # Verrundung10
    verrundung10_edges = [part.edges().sort_by_distance(p)[0] for p in [
        (0, -10.8, 7),
        (-1, -10.8, 7),
        (-1, -7, 7),
    ]]
    fillet(verrundung10_edges, radius=VERRUNDUNG10_R - 0.0001)  # a hair under: the kernel refuses the full size

    # Verrundung11
    verrundung11_edges = [part.edges().sort_by_distance(p)[0] for p in [
        (5.561744363, -7, 11.3),
    ]]
    fillet(verrundung11_edges, radius=VERRUNDUNG11_R)

    # Verrundung12
    verrundung12_edges = [part.edges().sort_by_distance(p)[0] for p in [
        (20.443697295, -7, 11.3),
    ]]
    fillet(verrundung12_edges, radius=VERRUNDUNG12_R)


solid = part.part
